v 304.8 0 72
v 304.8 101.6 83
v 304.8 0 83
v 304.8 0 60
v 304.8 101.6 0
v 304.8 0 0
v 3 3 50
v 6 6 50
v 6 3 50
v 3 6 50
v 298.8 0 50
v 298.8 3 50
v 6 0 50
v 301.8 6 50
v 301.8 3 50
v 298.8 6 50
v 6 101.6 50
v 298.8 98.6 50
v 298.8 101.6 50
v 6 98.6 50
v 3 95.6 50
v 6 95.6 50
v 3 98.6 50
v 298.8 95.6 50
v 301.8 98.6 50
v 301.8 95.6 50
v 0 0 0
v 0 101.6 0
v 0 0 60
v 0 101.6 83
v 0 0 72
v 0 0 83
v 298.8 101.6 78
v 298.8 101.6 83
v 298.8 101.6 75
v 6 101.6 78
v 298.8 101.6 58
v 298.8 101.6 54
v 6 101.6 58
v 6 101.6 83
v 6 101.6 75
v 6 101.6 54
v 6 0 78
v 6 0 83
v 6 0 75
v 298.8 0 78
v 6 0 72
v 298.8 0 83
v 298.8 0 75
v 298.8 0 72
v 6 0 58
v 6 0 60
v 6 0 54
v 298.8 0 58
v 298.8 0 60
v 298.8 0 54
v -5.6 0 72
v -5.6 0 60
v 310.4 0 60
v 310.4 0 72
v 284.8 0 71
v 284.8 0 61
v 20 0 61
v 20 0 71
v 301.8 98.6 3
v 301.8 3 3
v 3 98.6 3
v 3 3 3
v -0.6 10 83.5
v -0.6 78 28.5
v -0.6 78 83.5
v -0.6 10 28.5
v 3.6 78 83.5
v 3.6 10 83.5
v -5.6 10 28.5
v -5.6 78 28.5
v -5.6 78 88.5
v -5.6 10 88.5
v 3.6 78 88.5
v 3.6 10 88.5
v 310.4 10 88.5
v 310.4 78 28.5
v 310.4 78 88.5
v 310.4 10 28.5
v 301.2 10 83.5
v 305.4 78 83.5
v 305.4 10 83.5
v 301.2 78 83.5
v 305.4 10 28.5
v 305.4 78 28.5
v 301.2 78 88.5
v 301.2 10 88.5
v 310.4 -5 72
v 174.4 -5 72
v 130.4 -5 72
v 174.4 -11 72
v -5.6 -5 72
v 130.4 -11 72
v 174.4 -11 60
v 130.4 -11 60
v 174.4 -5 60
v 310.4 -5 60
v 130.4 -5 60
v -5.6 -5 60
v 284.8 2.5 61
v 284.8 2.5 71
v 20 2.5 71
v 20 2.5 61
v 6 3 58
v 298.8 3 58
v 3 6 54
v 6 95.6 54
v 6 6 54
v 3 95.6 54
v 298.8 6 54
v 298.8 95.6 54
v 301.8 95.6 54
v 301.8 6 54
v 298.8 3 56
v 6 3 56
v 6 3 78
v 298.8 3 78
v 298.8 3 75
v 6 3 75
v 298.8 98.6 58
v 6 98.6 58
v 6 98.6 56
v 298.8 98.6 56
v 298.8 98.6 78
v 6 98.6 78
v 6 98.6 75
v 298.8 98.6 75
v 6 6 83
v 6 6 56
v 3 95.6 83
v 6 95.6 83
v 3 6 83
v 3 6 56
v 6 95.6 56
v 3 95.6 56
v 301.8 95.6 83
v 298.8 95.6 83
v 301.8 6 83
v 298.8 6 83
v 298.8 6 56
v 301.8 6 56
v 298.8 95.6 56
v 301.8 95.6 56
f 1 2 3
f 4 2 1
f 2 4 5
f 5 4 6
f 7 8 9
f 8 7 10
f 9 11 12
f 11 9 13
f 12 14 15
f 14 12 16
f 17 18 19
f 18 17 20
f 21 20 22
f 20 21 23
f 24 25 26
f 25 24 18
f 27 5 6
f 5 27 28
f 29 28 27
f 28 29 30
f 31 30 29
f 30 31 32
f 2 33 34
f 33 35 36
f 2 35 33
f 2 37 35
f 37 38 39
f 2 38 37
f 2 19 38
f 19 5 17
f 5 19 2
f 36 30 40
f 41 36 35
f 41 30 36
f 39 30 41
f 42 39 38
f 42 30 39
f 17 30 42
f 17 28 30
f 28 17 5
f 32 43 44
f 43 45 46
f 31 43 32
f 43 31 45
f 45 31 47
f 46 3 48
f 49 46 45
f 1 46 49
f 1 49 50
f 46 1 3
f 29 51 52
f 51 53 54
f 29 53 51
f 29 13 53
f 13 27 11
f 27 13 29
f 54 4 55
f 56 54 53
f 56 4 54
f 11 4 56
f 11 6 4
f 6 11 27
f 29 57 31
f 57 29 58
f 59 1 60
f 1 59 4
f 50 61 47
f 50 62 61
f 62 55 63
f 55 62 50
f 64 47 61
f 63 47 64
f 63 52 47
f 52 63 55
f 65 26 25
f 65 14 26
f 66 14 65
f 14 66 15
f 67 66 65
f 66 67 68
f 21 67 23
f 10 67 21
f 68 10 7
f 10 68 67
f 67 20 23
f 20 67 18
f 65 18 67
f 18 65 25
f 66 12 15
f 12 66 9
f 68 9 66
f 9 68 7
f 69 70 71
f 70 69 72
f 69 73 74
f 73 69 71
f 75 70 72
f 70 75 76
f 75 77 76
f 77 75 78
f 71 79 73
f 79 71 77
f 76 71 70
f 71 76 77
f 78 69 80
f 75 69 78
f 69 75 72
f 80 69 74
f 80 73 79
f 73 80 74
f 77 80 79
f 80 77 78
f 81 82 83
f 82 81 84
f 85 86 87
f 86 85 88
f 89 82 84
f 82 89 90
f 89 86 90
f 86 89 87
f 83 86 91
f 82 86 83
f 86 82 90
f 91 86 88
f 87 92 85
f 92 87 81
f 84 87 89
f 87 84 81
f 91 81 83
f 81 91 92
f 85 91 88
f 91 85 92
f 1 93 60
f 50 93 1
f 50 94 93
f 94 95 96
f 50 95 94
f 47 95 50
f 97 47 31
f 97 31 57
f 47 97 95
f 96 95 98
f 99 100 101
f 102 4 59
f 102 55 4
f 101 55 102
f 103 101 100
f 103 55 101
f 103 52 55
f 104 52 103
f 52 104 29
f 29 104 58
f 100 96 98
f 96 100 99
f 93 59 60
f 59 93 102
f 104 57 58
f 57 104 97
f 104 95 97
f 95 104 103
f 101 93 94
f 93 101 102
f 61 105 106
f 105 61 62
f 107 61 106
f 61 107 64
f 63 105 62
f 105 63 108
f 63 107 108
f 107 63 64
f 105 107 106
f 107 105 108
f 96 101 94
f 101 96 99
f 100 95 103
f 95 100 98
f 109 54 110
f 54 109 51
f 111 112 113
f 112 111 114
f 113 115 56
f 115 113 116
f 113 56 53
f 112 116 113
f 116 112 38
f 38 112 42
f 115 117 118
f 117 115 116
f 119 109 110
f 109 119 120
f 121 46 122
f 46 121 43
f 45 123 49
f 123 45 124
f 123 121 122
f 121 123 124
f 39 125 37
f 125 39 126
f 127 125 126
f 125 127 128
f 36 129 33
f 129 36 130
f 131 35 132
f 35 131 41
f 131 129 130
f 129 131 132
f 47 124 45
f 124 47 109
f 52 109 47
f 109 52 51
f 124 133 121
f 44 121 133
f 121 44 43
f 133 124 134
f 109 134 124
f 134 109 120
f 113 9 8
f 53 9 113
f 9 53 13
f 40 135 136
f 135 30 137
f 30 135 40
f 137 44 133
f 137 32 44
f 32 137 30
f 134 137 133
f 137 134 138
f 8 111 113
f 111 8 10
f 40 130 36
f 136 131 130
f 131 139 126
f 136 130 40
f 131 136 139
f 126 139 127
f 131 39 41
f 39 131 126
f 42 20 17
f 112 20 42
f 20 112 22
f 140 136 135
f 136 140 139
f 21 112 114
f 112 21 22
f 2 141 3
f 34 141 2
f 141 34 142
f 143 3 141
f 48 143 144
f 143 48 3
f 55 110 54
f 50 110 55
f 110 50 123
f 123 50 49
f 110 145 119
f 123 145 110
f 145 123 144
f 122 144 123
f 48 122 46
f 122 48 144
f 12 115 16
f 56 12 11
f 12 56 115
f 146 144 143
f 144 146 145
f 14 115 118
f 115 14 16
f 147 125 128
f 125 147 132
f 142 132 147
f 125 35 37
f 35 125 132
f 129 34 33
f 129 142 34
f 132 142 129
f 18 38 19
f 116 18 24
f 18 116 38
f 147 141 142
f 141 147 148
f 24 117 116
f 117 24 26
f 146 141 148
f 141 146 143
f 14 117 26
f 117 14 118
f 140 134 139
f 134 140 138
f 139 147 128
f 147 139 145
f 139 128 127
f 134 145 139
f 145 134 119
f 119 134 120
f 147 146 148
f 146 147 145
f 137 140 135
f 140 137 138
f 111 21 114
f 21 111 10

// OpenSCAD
// file: ../top_ref.scad
// top_ref.scad  — FAITHFUL reference of the real uploaded top tray (L3.stl)
// Extracted from L3.stl by voxel analysis. Coordinates: new-tray top face = z=0 here,
// call top_ref(base=50) to seat it on a 50mm-tall new tray.
// DO NOT MODIFY THIS PART IN ANY DESIGN — it represents an already-printed tray.
//
// Real dims: 304.8 (X) x 101.6 (Y) x 33 (Z).
//  - END walls (short, x=0..3 and 301.8..304.8): SOLID full height -> top at z=33 (seated 83)
//  - LONG sides (front y=0..3, back y=98.6..101.6): OPEN FRAME
//        bottom rail z=4..8, top rail z=25..28, OPEN between (z=9..24)
//        side top edge at z=28 (seated 78)
//  - Corners: full height to z=33 (seated 83)
//  - Floor plate: z=4..6
// Seated mapping (base=50): add 50 to every z below.

TR_X = 304.8;
TR_Y = 101.6;
TR_Z = 33;
TR_wall = 3;        // side/end wall thickness
TR_endw = 3;        // short-end wall thickness
TR_botrail_z0 = 4;  TR_botrail_z1 = 8;     // long-side bottom rail
TR_toprail_z0 = 25; TR_toprail_z1 = 28;    // long-side top rail (side top edge=28)
TR_floor_z0 = 4;    TR_floor_z1 = 6;
TR_corner = 6;      // corner post footprint (x & y) kept full height

module top_ref(base=50, col="#90A4AE", alpha=1.0) {
    color(col, alpha)
    translate([0,0,base])
    union() {
        // ---- floor plate ----
        translate([TR_endw, TR_wall, TR_floor_z0])
            cube([TR_X-2*TR_endw, TR_Y-2*TR_wall, TR_floor_z1-TR_floor_z0]);
        // ---- two short END walls: full height ----
        cube([TR_endw, TR_Y, TR_Z]);
        translate([TR_X-TR_endw,0,0]) cube([TR_endw, TR_Y, TR_Z]);
        // ---- long-side OPEN FRAMES (front & back) ----
        for (yy=[0, TR_Y-TR_wall]) {
            // bottom rail
            translate([0, yy, TR_botrail_z0]) cube([TR_X, TR_wall, TR_botrail_z1-TR_botrail_z0]);
            // top rail (side top edge)
            translate([0, yy, TR_toprail_z0]) cube([TR_X, TR_wall, TR_toprail_z1-TR_toprail_z0]);
        }
        // ---- corner posts full height (tie frames together, reach z=33) ----
        for (xx=[0, TR_X-TR_corner], yy=[0, TR_Y-TR_corner])
            translate([xx,yy,0]) cube([TR_corner, TR_corner, TR_Z]);
    }
}

// Convenience constants a design can reference (seated, base=50):
//   END-wall top edge:        z = 50+33 = 83  (over the short ends -> strong clamp)
//   Long-side top rail top:   z = 50+28 = 78  (hook over / under along front)
//   Long-side open slot:      z = 50+9 .. 50+24 = 59..74 (reach a tongue in anywhere)
//   Corner top:               z = 83
// main file
// 03_overcenter_clamp.scad
// WILDCARD variant 3: OVER-CENTER SPINE LOCK
//
// Refinement: the spine bar now incorporates OVER-CENTER geometry.
// Instead of just sliding up, the spine bar is hinged at two front bosses on the
// new tray and SWINGS upward from a low stowed position into a locked
// over-center position.  At the top of the swing the jaw hooks snap over the
// end wall tops AND the spine bar's center section enters the front open slot
// (z=59..74) pressing upward into the front top rail — DOUBLE ENGAGEMENT.
//
// Physical action: one sweep of the thumb bar from down to up → both end hooks
// engage + front rail engaged = 3-point lock.  Over-center means the lock
// becomes MORE secure under pull-out load (tries to cam further in, not back).
//
// For simplicity in this simulation: the spine bar moves UP (like variant 2)
// but also has an inward-shifted section that enters the front slot in locked state.

show = "all"; // [all,new,top]
lock = 1;

include <../top_ref.scad>

$fn = 48;

NTX = 304.8;  NTY = 101.6;  NTZ = 50;  WALL = 3;
END_WALL_T = 3;
END_TOP_Z  = 83;
SLOT_BOT   = 59;   // front open slot bottom z
SLOT_TOP   = 74;   // front open slot top z
RAIL_BOT   = 75;   // front top rail bottom z

// Jaw (same L-hook as v1/v2)
JAW_T      = 5;    // slightly thicker for strength
JAW_GAP    = 0.6;
JAW_YW     = 68;
JAW_Y0     = 10;
JAW_H_OUTER = 55;
HOOK_H      = 5;
JAW_HOOK_Z_UNLOCK = 40;
JAW_HOOK_Z_LOCK   = 83.5;

// Spine with front-slot engagement
// In locked state: spine bottom enters front slot from outside
// Spine runs at y = -(SPINE_T) to y=0 (outside front face) when unlocked,
// and y = -(SPINE_T) to y=WALL (inserted to inside of front wall) when locked
SPINE_H_MAIN  = 12;   // main spine section height
SPINE_T_MAIN  = 5;    // spine depth in Y
SPINE_Z_LOCK  = 66;   // spine center Z when locked (mid of open slot z=59..74)
SPINE_Z_UNLOCK= 30;   // spine center Z when unlocked (below tray top z=50)

// Front-slot tongue: section of spine that enters the slot
// y goes from 0 to 2.5 (inside front wall slot area, clear of rails)
// Tongue must stay within z=59..74 (open slot)
TONGUE_T  = 2.5;   // tongue depth in Y (into front slot)
TONGUE_H  = 10;    // tongue height (z=61..71, safely inside open slot 59..74)
TONGUE_X0 = 20;    // tongue starts x=20 (clear of corners)
TONGUE_X1 = NTX-20;  // tongue ends x=284.8

module new_tray() {
    color("#1565C0")
    difference() {
        cube([NTX, NTY, NTZ]);
        translate([WALL, WALL, WALL])
            cube([NTX-2*WALL, NTY-2*WALL, NTZ-WALL+0.1]);
        // Front wall slot for tongue passage (z=61..71, inside open slot zone 59..74)
        translate([TONGUE_X0, -0.1, SPINE_Z_LOCK - TONGUE_H/2])
            cube([TONGUE_X1-TONGUE_X0, WALL+0.2, TONGUE_H]);
    }
}

module l_jaw(side, lock_state) {
    hook_z   = lock_state==1 ? JAW_HOOK_Z_LOCK : JAW_HOOK_Z_UNLOCK;
    outer_z0 = hook_z - JAW_H_OUTER;
    of_x     = side==0 ? -(JAW_T+JAW_GAP) : NTX+JAW_GAP;
    hook_x0  = side==0 ? -(JAW_T+JAW_GAP) : NTX-END_WALL_T-JAW_GAP;
    hook_xw  = JAW_T + END_WALL_T + 2*JAW_GAP;

    color("#D84315")
    translate([0, JAW_Y0, 0])
    union() {
        translate([of_x, 0, outer_z0])
            cube([JAW_T, JAW_YW, JAW_H_OUTER]);
        translate([hook_x0, 0, hook_z])
            cube([hook_xw, JAW_YW, HOOK_H]);
    }
}

module spine_bar(lock_state) {
    sz_ctr = lock_state==1 ? SPINE_Z_LOCK : SPINE_Z_UNLOCK;
    sz0    = sz_ctr - SPINE_H_MAIN/2;
    sy0    = -(SPINE_T_MAIN);

    color("#D84315")
    union() {
        // Main spine bar (at y<0, in front of new tray)
        translate([-(JAW_T+JAW_GAP), sy0, sz0])
            cube([NTX + 2*(JAW_T+JAW_GAP), SPINE_T_MAIN, SPINE_H_MAIN]);

        // Tongue section (only present when locked — enters front slot)
        if (lock_state == 1) {
            translate([TONGUE_X0, sy0, sz_ctr - TONGUE_H/2])
                cube([TONGUE_X1-TONGUE_X0, SPINE_T_MAIN + TONGUE_T, TONGUE_H]);
        } else {
            // Unlocked: no tongue protruding into slot
            translate([TONGUE_X0, sy0, sz_ctr - TONGUE_H/2])
                cube([TONGUE_X1-TONGUE_X0, SPINE_T_MAIN, TONGUE_H]);
        }

        // Center push grip on spine bar (ribbed area)
        translate([NTX/2 - 22, sy0 - 6, sz0])
            cube([44, 6, SPINE_H_MAIN]);
        for (rx = [-16, -8, 0, 8, 16]) {
            translate([NTX/2 + rx - 1, sy0 - 6, sz0])
                cube([2, 6, SPINE_H_MAIN]);
        }
    }
}

module new_assembly(lock_state) {
    new_tray();
    l_jaw(0, lock_state);
    l_jaw(1, lock_state);
    spine_bar(lock_state);
}

if (show != "top") new_assembly(lock);
if (show != "new") top_ref(50);
